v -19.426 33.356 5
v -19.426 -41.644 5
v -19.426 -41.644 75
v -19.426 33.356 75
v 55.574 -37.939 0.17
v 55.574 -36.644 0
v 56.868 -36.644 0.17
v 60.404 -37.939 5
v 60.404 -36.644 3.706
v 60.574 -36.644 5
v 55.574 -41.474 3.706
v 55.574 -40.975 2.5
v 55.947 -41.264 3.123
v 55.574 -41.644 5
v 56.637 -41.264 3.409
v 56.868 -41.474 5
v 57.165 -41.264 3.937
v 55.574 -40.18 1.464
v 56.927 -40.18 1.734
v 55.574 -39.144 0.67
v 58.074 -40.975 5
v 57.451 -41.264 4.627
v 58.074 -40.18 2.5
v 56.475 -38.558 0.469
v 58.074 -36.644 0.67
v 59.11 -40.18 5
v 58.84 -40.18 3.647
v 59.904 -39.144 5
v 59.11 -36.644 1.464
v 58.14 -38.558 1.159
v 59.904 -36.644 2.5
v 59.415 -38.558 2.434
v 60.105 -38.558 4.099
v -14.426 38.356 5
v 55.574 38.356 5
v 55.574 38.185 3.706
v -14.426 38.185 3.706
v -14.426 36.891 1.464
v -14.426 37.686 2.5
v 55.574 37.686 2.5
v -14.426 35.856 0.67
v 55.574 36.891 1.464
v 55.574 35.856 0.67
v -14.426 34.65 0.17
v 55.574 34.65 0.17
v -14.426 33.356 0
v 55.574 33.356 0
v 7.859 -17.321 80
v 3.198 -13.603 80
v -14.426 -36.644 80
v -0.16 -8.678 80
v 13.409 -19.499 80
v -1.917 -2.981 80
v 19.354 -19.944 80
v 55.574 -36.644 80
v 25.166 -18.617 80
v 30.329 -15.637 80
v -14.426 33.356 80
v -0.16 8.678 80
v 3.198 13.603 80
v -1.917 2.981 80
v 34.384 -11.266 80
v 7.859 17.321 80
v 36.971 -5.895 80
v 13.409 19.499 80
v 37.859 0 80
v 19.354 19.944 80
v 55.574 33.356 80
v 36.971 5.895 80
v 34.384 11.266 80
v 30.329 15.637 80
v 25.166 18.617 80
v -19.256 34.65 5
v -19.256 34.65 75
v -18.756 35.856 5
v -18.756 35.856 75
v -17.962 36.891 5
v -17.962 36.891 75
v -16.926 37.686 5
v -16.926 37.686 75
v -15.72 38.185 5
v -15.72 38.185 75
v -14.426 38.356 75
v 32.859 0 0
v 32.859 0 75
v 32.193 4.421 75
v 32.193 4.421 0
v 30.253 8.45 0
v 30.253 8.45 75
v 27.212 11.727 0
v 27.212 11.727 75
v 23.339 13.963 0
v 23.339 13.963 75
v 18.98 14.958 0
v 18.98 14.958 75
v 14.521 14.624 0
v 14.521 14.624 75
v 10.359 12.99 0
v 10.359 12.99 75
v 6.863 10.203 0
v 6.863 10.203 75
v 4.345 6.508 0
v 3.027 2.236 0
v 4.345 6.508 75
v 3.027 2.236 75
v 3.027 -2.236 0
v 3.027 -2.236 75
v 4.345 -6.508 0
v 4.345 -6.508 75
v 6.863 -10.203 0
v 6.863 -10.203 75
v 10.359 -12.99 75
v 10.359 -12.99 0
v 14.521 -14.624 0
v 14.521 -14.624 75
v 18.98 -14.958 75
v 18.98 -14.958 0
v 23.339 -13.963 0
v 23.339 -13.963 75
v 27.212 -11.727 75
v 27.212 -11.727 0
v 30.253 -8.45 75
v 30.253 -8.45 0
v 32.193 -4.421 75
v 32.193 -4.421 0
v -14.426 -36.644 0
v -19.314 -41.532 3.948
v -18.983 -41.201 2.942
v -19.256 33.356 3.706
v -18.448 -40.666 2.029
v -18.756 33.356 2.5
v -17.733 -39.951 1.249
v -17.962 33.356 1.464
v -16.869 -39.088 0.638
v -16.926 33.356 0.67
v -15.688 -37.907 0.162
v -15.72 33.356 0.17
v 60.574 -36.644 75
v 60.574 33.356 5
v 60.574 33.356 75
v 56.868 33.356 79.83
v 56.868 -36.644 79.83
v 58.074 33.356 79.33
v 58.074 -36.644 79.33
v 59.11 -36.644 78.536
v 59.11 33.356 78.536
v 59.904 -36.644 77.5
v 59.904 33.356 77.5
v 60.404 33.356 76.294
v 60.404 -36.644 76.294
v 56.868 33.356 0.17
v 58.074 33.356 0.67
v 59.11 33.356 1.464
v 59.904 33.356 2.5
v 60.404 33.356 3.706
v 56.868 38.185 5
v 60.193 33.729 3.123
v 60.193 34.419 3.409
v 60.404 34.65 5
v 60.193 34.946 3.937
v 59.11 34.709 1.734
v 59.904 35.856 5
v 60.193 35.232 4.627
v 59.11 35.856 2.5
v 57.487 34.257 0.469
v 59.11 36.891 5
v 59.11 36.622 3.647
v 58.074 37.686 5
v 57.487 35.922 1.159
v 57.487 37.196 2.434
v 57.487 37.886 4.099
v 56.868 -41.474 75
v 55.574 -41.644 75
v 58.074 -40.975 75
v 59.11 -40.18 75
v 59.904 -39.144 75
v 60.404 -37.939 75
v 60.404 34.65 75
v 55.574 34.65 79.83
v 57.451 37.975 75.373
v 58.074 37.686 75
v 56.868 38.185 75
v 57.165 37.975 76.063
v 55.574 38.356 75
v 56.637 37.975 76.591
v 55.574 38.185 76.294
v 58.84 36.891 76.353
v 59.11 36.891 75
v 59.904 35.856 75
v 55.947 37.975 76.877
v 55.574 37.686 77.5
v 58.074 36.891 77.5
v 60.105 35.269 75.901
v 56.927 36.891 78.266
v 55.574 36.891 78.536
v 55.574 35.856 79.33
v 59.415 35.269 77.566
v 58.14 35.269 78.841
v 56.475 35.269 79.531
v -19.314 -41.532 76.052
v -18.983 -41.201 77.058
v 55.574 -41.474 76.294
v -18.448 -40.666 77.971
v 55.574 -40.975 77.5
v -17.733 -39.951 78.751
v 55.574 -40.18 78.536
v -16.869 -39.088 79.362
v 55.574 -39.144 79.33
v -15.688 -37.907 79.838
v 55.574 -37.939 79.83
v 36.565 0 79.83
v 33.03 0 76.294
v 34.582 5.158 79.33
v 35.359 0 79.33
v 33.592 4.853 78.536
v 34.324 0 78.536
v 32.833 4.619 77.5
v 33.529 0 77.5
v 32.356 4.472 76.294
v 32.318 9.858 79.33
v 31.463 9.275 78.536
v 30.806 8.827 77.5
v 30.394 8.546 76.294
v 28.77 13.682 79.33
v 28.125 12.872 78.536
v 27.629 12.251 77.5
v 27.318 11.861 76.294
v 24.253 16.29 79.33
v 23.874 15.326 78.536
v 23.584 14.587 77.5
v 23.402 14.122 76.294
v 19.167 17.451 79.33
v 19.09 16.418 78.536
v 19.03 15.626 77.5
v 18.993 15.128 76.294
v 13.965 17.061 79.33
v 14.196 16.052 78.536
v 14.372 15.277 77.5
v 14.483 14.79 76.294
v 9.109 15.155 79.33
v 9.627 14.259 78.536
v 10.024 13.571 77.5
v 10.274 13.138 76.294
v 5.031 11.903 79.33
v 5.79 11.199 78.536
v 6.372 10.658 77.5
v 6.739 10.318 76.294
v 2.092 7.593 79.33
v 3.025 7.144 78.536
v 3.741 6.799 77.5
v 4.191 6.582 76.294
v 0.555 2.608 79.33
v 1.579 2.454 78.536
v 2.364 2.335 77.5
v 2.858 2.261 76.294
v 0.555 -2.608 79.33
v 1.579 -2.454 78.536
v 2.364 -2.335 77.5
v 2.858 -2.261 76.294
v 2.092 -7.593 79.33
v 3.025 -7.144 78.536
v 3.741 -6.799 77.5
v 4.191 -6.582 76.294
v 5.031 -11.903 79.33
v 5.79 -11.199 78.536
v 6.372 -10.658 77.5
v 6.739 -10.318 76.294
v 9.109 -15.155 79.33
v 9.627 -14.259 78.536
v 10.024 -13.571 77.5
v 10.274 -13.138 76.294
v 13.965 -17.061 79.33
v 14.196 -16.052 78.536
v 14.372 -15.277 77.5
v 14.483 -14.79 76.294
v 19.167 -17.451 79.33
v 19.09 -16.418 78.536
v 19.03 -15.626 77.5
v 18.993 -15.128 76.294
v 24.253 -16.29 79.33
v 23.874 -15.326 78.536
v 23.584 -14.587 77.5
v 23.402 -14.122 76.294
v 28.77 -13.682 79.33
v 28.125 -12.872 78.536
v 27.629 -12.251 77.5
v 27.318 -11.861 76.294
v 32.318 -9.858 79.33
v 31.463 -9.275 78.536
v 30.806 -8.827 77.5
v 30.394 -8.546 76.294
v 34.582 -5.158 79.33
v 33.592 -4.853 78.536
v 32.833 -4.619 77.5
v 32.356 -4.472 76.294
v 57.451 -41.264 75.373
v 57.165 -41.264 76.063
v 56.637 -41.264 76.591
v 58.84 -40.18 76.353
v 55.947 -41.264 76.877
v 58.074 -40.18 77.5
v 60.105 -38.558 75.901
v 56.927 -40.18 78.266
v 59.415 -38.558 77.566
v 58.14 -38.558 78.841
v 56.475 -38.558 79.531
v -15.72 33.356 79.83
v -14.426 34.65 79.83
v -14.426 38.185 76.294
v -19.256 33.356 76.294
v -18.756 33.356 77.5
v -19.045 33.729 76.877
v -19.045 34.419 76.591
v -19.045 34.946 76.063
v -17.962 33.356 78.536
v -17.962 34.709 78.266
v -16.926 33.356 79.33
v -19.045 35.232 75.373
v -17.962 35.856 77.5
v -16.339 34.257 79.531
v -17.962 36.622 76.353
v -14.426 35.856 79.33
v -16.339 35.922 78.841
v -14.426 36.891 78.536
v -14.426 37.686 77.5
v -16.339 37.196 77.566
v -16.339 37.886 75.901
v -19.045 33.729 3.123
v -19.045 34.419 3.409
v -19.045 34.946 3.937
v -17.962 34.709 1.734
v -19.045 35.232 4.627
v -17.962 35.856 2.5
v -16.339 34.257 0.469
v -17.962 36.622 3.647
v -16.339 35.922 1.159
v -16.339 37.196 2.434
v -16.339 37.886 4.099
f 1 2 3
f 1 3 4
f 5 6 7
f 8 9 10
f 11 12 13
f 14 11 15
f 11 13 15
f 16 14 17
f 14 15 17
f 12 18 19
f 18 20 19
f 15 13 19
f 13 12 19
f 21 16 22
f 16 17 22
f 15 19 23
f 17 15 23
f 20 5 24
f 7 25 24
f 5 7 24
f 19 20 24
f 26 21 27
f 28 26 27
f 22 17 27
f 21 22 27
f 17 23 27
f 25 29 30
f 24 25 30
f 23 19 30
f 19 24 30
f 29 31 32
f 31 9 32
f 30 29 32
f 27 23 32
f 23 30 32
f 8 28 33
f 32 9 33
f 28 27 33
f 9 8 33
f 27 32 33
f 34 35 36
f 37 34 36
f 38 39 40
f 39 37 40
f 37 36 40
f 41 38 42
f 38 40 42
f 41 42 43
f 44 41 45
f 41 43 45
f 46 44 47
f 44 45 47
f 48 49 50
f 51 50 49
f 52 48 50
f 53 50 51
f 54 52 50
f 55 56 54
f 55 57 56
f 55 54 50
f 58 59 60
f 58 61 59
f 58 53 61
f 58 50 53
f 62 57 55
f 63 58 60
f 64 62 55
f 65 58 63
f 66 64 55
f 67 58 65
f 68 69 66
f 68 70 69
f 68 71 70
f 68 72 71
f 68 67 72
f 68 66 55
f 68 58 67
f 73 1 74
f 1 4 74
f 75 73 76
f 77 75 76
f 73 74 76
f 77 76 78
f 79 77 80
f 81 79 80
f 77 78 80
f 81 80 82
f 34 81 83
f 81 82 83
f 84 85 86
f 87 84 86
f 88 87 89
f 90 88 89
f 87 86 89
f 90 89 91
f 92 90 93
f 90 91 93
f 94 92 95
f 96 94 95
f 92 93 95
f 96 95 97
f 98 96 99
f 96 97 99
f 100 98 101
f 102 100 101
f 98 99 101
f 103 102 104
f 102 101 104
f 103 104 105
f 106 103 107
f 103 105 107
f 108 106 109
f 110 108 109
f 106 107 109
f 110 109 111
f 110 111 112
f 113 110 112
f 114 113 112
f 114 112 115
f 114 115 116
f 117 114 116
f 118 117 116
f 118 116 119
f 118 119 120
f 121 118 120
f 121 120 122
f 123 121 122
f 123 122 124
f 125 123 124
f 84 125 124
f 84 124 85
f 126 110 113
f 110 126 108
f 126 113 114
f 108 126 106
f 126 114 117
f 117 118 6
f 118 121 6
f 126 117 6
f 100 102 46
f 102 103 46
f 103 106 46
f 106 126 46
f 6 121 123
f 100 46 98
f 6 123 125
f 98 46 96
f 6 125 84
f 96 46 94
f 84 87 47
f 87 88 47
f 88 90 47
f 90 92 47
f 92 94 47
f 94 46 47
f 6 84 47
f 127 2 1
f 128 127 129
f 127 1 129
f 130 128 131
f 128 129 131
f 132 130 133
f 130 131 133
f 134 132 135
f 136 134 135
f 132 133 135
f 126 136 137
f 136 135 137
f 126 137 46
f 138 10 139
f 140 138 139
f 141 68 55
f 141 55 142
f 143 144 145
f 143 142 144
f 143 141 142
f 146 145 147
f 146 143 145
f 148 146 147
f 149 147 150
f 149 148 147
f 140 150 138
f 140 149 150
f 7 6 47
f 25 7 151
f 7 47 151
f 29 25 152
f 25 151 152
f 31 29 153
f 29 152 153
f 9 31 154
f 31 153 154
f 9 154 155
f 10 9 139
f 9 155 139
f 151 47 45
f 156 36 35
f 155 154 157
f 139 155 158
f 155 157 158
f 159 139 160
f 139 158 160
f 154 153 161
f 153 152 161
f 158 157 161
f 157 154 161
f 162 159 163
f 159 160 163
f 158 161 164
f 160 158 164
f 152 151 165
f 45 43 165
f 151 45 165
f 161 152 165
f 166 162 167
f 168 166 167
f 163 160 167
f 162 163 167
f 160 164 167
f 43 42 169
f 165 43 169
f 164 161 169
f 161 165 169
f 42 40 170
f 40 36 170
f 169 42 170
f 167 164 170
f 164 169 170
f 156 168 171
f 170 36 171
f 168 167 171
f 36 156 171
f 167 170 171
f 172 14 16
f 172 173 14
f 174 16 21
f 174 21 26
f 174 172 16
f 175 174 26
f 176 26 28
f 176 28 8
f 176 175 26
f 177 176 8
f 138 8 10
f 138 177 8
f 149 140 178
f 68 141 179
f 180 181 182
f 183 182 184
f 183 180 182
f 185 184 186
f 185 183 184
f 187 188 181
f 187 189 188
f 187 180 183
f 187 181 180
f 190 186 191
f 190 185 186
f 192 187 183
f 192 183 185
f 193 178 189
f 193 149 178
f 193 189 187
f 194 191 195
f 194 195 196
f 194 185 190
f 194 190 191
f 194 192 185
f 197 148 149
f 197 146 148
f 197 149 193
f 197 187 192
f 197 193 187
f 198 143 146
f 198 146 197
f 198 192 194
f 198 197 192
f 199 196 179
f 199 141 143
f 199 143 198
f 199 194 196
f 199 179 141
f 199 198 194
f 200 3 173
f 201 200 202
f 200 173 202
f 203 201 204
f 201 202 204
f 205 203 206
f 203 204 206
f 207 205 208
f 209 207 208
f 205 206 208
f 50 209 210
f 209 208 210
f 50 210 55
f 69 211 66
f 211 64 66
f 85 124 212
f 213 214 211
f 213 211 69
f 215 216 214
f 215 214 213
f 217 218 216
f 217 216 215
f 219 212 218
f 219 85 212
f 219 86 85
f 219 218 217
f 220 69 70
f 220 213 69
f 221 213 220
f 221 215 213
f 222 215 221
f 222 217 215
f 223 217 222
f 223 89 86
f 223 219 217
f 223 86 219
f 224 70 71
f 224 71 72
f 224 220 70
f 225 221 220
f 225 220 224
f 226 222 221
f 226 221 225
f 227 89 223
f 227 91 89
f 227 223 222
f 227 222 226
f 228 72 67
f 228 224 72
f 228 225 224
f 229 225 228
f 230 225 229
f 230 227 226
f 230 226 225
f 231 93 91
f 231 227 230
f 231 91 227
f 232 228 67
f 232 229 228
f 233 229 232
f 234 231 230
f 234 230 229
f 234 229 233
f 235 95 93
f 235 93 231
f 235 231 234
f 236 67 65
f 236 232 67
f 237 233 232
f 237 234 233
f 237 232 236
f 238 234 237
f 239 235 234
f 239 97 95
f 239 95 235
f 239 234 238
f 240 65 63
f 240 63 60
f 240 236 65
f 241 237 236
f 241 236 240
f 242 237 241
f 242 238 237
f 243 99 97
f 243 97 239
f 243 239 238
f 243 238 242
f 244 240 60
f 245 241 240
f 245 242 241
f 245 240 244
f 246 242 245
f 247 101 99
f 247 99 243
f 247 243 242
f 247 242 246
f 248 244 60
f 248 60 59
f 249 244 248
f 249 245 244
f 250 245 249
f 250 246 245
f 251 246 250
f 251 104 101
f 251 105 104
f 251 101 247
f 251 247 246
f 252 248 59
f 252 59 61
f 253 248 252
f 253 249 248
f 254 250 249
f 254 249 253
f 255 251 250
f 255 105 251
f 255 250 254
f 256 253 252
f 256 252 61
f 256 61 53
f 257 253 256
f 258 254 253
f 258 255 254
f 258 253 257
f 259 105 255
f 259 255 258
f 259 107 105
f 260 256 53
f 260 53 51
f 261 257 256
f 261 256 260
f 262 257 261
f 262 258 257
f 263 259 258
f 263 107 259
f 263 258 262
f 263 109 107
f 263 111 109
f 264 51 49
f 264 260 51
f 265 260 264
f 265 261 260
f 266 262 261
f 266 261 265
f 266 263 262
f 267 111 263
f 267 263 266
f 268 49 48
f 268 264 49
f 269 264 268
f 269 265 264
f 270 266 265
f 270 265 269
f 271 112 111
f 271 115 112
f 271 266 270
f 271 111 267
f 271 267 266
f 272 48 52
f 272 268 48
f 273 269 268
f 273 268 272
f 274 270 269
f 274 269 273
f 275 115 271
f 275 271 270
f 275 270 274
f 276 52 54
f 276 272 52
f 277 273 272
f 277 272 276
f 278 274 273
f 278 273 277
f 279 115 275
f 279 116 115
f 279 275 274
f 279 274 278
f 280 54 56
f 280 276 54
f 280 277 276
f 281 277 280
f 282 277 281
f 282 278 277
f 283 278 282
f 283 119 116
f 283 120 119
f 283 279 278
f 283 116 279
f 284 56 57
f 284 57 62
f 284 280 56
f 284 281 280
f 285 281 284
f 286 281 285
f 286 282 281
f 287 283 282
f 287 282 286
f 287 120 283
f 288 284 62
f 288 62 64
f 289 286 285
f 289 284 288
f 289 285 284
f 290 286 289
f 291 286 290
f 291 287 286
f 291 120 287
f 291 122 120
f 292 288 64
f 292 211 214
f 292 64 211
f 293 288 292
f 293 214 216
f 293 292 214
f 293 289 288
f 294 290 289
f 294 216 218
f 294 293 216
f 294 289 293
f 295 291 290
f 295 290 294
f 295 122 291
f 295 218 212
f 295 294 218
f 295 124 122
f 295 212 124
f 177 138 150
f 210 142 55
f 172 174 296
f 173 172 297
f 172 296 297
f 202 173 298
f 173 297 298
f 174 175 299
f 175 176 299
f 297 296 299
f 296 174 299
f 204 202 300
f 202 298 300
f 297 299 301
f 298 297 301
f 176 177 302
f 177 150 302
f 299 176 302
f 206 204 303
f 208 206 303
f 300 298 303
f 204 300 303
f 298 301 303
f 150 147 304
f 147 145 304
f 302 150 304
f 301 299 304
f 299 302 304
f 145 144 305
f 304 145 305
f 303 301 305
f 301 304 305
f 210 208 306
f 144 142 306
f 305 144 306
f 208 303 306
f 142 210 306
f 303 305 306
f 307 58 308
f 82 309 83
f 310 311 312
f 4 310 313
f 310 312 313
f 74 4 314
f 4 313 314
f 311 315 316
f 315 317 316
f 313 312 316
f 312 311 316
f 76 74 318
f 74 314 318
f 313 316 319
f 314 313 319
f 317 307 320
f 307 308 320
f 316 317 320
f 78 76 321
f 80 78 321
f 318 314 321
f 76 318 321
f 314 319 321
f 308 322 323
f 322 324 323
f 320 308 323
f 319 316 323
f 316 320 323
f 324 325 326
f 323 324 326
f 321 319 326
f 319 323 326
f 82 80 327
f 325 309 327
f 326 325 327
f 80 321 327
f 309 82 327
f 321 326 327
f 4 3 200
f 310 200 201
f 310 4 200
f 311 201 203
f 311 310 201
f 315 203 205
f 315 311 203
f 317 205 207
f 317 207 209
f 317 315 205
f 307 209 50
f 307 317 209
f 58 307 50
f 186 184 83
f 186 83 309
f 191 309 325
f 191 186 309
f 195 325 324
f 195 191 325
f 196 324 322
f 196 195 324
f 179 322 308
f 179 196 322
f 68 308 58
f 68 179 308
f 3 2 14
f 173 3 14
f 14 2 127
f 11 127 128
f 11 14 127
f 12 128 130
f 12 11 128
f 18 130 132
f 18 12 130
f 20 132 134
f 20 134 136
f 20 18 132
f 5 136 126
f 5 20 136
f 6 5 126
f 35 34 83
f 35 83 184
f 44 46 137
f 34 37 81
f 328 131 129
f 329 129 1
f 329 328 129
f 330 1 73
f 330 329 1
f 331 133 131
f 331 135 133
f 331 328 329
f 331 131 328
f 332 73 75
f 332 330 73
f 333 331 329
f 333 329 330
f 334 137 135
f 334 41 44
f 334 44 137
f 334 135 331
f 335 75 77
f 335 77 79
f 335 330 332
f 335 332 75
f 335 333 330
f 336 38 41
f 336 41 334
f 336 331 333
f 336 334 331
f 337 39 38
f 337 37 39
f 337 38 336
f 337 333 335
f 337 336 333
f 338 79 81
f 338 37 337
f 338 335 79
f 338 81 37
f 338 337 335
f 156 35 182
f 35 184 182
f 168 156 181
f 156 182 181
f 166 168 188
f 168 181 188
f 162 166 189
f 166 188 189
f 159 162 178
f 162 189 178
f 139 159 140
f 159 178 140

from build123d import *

# Parameters (mm, degrees)
F0_W     = 80
F0_H     = 80
F1_DEPTH = 80
F2_R     = 15
F3_DEPTH = 80.001
F4_R     = 5


with BuildPart() as f1:
    # F0 (on Top) → F1 (new body)
    with BuildSketch(Plane.XY):
        with Locations((20.5740025267, -1.6444633871)):
            Rectangle(F0_W, F0_H)
    extrude(amount=F1_DEPTH)

    # F2 (on face) → F3 (cut, through all)
    with BuildSketch(Plane.XY.offset(80)):
        with Locations((17.8592021294, 0)):
            Circle(F2_R)
    extrude(amount=-F3_DEPTH, mode=Mode.SUBTRACT)

    # F4
    f4_edges = [f1.edges().sort_by_distance(p)[0] for p in [
        (20.574003, 38.355537, 0),
        (60.574003, -1.644463, 0),
        (20.574003, -41.644463, 0),
        (-19.425997, -1.644463, 0),
        (60.574003, -1.644463, 80),
        (60.574003, -41.644463, 40),
        (60.574003, 38.355537, 40),
        (20.574003, 38.355537, 80),
        (-19.425997, -1.644463, 80),
        (20.574003, -41.644463, 80),
        (2.859202, 0, 80),
        (-19.425997, 38.355537, 40),
    ]]
    fillet(f4_edges, radius=F4_R)


solid = f1.part
